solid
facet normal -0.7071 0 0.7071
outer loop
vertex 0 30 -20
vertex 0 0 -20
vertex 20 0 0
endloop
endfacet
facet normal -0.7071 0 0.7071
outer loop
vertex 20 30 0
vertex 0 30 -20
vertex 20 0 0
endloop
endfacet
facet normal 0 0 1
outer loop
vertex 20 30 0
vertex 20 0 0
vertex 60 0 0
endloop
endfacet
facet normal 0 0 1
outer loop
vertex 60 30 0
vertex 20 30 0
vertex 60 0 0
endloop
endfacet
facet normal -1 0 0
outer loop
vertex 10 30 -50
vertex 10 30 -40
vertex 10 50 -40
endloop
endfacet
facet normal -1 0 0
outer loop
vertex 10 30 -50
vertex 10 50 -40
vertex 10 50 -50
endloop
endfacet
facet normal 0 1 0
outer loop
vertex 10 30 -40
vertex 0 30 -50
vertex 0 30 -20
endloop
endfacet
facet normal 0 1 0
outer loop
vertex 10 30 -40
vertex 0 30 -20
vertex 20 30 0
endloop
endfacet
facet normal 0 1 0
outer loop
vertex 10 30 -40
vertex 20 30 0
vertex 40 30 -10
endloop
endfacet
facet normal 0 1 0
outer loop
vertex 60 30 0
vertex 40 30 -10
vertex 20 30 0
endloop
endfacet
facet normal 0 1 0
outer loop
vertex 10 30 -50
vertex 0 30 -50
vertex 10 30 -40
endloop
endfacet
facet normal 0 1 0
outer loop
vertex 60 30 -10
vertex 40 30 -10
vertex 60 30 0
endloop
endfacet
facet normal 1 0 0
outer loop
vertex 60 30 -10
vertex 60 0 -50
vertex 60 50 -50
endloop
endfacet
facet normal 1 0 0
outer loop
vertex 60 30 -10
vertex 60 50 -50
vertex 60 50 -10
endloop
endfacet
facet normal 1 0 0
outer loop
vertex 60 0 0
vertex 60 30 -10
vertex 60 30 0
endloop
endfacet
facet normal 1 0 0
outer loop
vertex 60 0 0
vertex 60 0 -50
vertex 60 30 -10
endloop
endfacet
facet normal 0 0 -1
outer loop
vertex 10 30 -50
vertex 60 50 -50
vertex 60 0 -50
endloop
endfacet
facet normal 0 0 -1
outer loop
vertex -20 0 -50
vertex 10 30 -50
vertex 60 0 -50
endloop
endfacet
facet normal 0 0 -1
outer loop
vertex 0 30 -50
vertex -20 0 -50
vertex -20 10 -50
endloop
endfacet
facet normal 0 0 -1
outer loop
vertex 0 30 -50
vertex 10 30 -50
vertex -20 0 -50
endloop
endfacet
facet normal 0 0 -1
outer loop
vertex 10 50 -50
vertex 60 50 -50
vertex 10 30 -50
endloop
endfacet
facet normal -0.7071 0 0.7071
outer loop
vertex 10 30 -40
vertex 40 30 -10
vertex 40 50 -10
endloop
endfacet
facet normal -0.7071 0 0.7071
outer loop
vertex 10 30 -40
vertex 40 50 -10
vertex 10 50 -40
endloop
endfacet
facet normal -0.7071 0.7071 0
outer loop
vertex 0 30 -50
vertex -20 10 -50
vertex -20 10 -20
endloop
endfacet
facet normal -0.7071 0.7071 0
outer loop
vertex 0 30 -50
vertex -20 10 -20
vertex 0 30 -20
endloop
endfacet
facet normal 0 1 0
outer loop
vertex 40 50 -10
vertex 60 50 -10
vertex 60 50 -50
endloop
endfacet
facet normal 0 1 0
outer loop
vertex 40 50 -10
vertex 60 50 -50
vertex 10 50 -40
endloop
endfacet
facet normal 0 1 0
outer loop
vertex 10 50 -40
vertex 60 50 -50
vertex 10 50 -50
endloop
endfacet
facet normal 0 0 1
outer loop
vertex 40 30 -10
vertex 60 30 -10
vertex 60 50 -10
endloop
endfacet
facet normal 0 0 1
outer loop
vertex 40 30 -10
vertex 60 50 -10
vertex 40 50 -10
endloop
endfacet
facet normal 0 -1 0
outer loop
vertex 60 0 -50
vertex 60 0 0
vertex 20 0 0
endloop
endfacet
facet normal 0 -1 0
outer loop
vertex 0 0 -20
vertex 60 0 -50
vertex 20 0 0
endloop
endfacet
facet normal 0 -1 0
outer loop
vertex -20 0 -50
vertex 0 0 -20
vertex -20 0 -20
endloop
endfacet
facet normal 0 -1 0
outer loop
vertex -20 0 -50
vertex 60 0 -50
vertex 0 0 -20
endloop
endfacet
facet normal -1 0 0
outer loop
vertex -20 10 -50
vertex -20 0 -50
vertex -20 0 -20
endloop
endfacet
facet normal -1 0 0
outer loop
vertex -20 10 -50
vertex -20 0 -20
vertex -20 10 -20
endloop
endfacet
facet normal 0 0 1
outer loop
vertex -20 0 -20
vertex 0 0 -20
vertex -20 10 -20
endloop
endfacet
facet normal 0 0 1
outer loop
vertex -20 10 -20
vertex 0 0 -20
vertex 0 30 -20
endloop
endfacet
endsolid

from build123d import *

# Parameters (mm, degrees)
SKETCH1_W           = 60
SKETCH1_H           = 50
BOSS_EXTRUDE1_DEPTH = 30
CUT_EXTRUDE1_DEPTH  = 30
BOSS_EXTRUDE2_DEPTH = 20
BOSS_EXTRUDE3_DEPTH = 30


with BuildPart() as part:
    # Sketch1 → Boss-Extrude1 (new body)
    with BuildSketch(Plane(origin=(0, 0, 0), x_dir=(1, 0, 0), z_dir=(0, 1, 0))):
        with Locations((30, 25)):
            Rectangle(SKETCH1_W, SKETCH1_H)
    extrude(amount=BOSS_EXTRUDE1_DEPTH)

    # Sketch2 → Cut-Extrude1 (cut)
    with BuildSketch(Plane(origin=(0, 30, 0), x_dir=(1, 0, 0), z_dir=(0, 1, 0))):
        Polygon((0, 20), (20, 0), (0, 0), align=None)
    extrude(amount=-CUT_EXTRUDE1_DEPTH, mode=Mode.SUBTRACT)

    # Sketch3 → Boss-Extrude2 (add)
    with BuildSketch(Plane(origin=(0, 30, 0), x_dir=(1, 0, 0), z_dir=(0, 1, 0))):
        Polygon((10, 50), (60, 50), (60, 10), (40, 10), (10, 40), align=None)
    extrude(amount=BOSS_EXTRUDE2_DEPTH)

    # Sketch4 → Boss-Extrude3 (add)
    with BuildSketch(Plane(origin=(0, 0, -50), x_dir=(-1, 0, 0), z_dir=(0, 0, -1))):
        Polygon((20, 0), (20, 10), (0, 30), (0, 0), align=None)
    extrude(amount=-BOSS_EXTRUDE3_DEPTH)


solid = part.part
